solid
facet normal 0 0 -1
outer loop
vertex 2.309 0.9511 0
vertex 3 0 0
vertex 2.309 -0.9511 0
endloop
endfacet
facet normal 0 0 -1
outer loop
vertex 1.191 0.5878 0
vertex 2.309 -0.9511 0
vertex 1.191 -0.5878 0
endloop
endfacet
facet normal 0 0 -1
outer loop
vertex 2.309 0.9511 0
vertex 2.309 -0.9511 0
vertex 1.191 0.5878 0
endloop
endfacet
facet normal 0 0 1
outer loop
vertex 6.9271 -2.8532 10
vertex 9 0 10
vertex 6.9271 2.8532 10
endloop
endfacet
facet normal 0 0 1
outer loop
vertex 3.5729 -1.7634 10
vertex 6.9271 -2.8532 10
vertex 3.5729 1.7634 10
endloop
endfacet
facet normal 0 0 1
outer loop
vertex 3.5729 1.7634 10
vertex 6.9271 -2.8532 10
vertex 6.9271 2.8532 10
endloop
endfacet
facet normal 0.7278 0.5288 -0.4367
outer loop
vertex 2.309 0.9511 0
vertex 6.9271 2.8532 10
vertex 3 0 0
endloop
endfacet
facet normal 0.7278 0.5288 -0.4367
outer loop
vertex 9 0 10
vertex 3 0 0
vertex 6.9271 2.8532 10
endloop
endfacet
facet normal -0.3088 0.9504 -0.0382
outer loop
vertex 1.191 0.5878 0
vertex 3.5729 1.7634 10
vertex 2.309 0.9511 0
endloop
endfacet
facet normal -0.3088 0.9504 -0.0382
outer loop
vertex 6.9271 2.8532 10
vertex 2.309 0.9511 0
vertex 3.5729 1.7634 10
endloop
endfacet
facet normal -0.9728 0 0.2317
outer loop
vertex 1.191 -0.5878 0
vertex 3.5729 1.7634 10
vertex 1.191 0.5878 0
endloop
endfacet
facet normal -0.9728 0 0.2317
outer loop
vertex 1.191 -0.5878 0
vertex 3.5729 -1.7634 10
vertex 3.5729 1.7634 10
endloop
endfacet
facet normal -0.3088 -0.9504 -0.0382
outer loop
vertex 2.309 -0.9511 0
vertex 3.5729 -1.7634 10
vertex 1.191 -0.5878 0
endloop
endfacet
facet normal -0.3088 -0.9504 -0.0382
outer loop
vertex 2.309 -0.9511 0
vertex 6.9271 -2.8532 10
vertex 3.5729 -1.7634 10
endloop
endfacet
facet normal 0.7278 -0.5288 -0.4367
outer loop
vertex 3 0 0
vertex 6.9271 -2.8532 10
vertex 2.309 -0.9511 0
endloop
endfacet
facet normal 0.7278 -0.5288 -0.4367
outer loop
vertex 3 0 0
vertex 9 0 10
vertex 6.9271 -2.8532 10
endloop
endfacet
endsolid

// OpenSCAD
// Unit of length: Unit.MM
linear_extrude(height = 10.0, center = false, convexity = 10, twist = 0.0, scale = 3.0)
{
   translate(v = [2.0, 0.0])
   {
      circle(r = 1.0);
   }
}
